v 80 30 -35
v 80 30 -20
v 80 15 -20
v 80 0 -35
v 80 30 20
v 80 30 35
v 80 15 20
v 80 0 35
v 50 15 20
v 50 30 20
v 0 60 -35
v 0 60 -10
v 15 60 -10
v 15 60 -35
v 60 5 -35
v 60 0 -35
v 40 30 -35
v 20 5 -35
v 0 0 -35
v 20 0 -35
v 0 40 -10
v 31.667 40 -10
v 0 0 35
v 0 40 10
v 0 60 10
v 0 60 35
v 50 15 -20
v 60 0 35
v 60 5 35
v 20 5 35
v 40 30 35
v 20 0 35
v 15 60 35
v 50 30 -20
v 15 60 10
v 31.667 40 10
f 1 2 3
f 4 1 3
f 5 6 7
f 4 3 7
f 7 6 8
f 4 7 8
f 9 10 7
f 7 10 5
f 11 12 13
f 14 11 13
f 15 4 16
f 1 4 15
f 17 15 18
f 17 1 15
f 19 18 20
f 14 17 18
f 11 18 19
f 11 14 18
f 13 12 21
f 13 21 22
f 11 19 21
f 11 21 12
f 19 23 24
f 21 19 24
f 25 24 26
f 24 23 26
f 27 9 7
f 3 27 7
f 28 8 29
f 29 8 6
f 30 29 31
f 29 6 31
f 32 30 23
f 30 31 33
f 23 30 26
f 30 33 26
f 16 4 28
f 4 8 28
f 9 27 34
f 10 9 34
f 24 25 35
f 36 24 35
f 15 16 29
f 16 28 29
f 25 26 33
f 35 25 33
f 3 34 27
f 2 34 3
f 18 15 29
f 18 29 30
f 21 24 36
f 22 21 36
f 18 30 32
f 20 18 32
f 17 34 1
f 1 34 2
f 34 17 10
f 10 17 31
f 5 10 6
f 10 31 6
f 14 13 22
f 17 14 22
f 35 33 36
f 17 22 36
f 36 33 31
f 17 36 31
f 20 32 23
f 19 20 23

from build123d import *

# Parameters (mm, degrees)
BOSS_EXTRUDE1_DEPTH = 35
CUT_EXTRUDE1_DEPTH  = 10
SKETCH3_W           = 30
SKETCH3_H           = 15
CUT_EXTRUDE2_DEPTH  = 20


with BuildPart() as part:
    # Sketch1 → Boss-Extrude1 (new body, symmetric)
    with BuildSketch(Plane.XY):
        Polygon((0, 0), (0, 60), (15, 60), (40, 30), (80, 30), (80, 0), (60, 0), (60, 5), (20, 5), (20, 0), align=None)
    extrude(amount=BOSS_EXTRUDE1_DEPTH, both=True)

    # Sketch2 → Cut-Extrude1 (cut, symmetric)
    with BuildSketch(Plane.XY):
        Polygon((15, 60), (0, 60), (0, 40), (31.666666667, 40), align=None)
    extrude(amount=CUT_EXTRUDE1_DEPTH, both=True, mode=Mode.SUBTRACT)

    # Sketch3 → Cut-Extrude2 (cut, symmetric)
    with BuildSketch(Plane.XY):
        with Locations((65, 22.5)):
            Rectangle(SKETCH3_W, SKETCH3_H)
    extrude(amount=CUT_EXTRUDE2_DEPTH, both=True, mode=Mode.SUBTRACT)


solid = part.part
